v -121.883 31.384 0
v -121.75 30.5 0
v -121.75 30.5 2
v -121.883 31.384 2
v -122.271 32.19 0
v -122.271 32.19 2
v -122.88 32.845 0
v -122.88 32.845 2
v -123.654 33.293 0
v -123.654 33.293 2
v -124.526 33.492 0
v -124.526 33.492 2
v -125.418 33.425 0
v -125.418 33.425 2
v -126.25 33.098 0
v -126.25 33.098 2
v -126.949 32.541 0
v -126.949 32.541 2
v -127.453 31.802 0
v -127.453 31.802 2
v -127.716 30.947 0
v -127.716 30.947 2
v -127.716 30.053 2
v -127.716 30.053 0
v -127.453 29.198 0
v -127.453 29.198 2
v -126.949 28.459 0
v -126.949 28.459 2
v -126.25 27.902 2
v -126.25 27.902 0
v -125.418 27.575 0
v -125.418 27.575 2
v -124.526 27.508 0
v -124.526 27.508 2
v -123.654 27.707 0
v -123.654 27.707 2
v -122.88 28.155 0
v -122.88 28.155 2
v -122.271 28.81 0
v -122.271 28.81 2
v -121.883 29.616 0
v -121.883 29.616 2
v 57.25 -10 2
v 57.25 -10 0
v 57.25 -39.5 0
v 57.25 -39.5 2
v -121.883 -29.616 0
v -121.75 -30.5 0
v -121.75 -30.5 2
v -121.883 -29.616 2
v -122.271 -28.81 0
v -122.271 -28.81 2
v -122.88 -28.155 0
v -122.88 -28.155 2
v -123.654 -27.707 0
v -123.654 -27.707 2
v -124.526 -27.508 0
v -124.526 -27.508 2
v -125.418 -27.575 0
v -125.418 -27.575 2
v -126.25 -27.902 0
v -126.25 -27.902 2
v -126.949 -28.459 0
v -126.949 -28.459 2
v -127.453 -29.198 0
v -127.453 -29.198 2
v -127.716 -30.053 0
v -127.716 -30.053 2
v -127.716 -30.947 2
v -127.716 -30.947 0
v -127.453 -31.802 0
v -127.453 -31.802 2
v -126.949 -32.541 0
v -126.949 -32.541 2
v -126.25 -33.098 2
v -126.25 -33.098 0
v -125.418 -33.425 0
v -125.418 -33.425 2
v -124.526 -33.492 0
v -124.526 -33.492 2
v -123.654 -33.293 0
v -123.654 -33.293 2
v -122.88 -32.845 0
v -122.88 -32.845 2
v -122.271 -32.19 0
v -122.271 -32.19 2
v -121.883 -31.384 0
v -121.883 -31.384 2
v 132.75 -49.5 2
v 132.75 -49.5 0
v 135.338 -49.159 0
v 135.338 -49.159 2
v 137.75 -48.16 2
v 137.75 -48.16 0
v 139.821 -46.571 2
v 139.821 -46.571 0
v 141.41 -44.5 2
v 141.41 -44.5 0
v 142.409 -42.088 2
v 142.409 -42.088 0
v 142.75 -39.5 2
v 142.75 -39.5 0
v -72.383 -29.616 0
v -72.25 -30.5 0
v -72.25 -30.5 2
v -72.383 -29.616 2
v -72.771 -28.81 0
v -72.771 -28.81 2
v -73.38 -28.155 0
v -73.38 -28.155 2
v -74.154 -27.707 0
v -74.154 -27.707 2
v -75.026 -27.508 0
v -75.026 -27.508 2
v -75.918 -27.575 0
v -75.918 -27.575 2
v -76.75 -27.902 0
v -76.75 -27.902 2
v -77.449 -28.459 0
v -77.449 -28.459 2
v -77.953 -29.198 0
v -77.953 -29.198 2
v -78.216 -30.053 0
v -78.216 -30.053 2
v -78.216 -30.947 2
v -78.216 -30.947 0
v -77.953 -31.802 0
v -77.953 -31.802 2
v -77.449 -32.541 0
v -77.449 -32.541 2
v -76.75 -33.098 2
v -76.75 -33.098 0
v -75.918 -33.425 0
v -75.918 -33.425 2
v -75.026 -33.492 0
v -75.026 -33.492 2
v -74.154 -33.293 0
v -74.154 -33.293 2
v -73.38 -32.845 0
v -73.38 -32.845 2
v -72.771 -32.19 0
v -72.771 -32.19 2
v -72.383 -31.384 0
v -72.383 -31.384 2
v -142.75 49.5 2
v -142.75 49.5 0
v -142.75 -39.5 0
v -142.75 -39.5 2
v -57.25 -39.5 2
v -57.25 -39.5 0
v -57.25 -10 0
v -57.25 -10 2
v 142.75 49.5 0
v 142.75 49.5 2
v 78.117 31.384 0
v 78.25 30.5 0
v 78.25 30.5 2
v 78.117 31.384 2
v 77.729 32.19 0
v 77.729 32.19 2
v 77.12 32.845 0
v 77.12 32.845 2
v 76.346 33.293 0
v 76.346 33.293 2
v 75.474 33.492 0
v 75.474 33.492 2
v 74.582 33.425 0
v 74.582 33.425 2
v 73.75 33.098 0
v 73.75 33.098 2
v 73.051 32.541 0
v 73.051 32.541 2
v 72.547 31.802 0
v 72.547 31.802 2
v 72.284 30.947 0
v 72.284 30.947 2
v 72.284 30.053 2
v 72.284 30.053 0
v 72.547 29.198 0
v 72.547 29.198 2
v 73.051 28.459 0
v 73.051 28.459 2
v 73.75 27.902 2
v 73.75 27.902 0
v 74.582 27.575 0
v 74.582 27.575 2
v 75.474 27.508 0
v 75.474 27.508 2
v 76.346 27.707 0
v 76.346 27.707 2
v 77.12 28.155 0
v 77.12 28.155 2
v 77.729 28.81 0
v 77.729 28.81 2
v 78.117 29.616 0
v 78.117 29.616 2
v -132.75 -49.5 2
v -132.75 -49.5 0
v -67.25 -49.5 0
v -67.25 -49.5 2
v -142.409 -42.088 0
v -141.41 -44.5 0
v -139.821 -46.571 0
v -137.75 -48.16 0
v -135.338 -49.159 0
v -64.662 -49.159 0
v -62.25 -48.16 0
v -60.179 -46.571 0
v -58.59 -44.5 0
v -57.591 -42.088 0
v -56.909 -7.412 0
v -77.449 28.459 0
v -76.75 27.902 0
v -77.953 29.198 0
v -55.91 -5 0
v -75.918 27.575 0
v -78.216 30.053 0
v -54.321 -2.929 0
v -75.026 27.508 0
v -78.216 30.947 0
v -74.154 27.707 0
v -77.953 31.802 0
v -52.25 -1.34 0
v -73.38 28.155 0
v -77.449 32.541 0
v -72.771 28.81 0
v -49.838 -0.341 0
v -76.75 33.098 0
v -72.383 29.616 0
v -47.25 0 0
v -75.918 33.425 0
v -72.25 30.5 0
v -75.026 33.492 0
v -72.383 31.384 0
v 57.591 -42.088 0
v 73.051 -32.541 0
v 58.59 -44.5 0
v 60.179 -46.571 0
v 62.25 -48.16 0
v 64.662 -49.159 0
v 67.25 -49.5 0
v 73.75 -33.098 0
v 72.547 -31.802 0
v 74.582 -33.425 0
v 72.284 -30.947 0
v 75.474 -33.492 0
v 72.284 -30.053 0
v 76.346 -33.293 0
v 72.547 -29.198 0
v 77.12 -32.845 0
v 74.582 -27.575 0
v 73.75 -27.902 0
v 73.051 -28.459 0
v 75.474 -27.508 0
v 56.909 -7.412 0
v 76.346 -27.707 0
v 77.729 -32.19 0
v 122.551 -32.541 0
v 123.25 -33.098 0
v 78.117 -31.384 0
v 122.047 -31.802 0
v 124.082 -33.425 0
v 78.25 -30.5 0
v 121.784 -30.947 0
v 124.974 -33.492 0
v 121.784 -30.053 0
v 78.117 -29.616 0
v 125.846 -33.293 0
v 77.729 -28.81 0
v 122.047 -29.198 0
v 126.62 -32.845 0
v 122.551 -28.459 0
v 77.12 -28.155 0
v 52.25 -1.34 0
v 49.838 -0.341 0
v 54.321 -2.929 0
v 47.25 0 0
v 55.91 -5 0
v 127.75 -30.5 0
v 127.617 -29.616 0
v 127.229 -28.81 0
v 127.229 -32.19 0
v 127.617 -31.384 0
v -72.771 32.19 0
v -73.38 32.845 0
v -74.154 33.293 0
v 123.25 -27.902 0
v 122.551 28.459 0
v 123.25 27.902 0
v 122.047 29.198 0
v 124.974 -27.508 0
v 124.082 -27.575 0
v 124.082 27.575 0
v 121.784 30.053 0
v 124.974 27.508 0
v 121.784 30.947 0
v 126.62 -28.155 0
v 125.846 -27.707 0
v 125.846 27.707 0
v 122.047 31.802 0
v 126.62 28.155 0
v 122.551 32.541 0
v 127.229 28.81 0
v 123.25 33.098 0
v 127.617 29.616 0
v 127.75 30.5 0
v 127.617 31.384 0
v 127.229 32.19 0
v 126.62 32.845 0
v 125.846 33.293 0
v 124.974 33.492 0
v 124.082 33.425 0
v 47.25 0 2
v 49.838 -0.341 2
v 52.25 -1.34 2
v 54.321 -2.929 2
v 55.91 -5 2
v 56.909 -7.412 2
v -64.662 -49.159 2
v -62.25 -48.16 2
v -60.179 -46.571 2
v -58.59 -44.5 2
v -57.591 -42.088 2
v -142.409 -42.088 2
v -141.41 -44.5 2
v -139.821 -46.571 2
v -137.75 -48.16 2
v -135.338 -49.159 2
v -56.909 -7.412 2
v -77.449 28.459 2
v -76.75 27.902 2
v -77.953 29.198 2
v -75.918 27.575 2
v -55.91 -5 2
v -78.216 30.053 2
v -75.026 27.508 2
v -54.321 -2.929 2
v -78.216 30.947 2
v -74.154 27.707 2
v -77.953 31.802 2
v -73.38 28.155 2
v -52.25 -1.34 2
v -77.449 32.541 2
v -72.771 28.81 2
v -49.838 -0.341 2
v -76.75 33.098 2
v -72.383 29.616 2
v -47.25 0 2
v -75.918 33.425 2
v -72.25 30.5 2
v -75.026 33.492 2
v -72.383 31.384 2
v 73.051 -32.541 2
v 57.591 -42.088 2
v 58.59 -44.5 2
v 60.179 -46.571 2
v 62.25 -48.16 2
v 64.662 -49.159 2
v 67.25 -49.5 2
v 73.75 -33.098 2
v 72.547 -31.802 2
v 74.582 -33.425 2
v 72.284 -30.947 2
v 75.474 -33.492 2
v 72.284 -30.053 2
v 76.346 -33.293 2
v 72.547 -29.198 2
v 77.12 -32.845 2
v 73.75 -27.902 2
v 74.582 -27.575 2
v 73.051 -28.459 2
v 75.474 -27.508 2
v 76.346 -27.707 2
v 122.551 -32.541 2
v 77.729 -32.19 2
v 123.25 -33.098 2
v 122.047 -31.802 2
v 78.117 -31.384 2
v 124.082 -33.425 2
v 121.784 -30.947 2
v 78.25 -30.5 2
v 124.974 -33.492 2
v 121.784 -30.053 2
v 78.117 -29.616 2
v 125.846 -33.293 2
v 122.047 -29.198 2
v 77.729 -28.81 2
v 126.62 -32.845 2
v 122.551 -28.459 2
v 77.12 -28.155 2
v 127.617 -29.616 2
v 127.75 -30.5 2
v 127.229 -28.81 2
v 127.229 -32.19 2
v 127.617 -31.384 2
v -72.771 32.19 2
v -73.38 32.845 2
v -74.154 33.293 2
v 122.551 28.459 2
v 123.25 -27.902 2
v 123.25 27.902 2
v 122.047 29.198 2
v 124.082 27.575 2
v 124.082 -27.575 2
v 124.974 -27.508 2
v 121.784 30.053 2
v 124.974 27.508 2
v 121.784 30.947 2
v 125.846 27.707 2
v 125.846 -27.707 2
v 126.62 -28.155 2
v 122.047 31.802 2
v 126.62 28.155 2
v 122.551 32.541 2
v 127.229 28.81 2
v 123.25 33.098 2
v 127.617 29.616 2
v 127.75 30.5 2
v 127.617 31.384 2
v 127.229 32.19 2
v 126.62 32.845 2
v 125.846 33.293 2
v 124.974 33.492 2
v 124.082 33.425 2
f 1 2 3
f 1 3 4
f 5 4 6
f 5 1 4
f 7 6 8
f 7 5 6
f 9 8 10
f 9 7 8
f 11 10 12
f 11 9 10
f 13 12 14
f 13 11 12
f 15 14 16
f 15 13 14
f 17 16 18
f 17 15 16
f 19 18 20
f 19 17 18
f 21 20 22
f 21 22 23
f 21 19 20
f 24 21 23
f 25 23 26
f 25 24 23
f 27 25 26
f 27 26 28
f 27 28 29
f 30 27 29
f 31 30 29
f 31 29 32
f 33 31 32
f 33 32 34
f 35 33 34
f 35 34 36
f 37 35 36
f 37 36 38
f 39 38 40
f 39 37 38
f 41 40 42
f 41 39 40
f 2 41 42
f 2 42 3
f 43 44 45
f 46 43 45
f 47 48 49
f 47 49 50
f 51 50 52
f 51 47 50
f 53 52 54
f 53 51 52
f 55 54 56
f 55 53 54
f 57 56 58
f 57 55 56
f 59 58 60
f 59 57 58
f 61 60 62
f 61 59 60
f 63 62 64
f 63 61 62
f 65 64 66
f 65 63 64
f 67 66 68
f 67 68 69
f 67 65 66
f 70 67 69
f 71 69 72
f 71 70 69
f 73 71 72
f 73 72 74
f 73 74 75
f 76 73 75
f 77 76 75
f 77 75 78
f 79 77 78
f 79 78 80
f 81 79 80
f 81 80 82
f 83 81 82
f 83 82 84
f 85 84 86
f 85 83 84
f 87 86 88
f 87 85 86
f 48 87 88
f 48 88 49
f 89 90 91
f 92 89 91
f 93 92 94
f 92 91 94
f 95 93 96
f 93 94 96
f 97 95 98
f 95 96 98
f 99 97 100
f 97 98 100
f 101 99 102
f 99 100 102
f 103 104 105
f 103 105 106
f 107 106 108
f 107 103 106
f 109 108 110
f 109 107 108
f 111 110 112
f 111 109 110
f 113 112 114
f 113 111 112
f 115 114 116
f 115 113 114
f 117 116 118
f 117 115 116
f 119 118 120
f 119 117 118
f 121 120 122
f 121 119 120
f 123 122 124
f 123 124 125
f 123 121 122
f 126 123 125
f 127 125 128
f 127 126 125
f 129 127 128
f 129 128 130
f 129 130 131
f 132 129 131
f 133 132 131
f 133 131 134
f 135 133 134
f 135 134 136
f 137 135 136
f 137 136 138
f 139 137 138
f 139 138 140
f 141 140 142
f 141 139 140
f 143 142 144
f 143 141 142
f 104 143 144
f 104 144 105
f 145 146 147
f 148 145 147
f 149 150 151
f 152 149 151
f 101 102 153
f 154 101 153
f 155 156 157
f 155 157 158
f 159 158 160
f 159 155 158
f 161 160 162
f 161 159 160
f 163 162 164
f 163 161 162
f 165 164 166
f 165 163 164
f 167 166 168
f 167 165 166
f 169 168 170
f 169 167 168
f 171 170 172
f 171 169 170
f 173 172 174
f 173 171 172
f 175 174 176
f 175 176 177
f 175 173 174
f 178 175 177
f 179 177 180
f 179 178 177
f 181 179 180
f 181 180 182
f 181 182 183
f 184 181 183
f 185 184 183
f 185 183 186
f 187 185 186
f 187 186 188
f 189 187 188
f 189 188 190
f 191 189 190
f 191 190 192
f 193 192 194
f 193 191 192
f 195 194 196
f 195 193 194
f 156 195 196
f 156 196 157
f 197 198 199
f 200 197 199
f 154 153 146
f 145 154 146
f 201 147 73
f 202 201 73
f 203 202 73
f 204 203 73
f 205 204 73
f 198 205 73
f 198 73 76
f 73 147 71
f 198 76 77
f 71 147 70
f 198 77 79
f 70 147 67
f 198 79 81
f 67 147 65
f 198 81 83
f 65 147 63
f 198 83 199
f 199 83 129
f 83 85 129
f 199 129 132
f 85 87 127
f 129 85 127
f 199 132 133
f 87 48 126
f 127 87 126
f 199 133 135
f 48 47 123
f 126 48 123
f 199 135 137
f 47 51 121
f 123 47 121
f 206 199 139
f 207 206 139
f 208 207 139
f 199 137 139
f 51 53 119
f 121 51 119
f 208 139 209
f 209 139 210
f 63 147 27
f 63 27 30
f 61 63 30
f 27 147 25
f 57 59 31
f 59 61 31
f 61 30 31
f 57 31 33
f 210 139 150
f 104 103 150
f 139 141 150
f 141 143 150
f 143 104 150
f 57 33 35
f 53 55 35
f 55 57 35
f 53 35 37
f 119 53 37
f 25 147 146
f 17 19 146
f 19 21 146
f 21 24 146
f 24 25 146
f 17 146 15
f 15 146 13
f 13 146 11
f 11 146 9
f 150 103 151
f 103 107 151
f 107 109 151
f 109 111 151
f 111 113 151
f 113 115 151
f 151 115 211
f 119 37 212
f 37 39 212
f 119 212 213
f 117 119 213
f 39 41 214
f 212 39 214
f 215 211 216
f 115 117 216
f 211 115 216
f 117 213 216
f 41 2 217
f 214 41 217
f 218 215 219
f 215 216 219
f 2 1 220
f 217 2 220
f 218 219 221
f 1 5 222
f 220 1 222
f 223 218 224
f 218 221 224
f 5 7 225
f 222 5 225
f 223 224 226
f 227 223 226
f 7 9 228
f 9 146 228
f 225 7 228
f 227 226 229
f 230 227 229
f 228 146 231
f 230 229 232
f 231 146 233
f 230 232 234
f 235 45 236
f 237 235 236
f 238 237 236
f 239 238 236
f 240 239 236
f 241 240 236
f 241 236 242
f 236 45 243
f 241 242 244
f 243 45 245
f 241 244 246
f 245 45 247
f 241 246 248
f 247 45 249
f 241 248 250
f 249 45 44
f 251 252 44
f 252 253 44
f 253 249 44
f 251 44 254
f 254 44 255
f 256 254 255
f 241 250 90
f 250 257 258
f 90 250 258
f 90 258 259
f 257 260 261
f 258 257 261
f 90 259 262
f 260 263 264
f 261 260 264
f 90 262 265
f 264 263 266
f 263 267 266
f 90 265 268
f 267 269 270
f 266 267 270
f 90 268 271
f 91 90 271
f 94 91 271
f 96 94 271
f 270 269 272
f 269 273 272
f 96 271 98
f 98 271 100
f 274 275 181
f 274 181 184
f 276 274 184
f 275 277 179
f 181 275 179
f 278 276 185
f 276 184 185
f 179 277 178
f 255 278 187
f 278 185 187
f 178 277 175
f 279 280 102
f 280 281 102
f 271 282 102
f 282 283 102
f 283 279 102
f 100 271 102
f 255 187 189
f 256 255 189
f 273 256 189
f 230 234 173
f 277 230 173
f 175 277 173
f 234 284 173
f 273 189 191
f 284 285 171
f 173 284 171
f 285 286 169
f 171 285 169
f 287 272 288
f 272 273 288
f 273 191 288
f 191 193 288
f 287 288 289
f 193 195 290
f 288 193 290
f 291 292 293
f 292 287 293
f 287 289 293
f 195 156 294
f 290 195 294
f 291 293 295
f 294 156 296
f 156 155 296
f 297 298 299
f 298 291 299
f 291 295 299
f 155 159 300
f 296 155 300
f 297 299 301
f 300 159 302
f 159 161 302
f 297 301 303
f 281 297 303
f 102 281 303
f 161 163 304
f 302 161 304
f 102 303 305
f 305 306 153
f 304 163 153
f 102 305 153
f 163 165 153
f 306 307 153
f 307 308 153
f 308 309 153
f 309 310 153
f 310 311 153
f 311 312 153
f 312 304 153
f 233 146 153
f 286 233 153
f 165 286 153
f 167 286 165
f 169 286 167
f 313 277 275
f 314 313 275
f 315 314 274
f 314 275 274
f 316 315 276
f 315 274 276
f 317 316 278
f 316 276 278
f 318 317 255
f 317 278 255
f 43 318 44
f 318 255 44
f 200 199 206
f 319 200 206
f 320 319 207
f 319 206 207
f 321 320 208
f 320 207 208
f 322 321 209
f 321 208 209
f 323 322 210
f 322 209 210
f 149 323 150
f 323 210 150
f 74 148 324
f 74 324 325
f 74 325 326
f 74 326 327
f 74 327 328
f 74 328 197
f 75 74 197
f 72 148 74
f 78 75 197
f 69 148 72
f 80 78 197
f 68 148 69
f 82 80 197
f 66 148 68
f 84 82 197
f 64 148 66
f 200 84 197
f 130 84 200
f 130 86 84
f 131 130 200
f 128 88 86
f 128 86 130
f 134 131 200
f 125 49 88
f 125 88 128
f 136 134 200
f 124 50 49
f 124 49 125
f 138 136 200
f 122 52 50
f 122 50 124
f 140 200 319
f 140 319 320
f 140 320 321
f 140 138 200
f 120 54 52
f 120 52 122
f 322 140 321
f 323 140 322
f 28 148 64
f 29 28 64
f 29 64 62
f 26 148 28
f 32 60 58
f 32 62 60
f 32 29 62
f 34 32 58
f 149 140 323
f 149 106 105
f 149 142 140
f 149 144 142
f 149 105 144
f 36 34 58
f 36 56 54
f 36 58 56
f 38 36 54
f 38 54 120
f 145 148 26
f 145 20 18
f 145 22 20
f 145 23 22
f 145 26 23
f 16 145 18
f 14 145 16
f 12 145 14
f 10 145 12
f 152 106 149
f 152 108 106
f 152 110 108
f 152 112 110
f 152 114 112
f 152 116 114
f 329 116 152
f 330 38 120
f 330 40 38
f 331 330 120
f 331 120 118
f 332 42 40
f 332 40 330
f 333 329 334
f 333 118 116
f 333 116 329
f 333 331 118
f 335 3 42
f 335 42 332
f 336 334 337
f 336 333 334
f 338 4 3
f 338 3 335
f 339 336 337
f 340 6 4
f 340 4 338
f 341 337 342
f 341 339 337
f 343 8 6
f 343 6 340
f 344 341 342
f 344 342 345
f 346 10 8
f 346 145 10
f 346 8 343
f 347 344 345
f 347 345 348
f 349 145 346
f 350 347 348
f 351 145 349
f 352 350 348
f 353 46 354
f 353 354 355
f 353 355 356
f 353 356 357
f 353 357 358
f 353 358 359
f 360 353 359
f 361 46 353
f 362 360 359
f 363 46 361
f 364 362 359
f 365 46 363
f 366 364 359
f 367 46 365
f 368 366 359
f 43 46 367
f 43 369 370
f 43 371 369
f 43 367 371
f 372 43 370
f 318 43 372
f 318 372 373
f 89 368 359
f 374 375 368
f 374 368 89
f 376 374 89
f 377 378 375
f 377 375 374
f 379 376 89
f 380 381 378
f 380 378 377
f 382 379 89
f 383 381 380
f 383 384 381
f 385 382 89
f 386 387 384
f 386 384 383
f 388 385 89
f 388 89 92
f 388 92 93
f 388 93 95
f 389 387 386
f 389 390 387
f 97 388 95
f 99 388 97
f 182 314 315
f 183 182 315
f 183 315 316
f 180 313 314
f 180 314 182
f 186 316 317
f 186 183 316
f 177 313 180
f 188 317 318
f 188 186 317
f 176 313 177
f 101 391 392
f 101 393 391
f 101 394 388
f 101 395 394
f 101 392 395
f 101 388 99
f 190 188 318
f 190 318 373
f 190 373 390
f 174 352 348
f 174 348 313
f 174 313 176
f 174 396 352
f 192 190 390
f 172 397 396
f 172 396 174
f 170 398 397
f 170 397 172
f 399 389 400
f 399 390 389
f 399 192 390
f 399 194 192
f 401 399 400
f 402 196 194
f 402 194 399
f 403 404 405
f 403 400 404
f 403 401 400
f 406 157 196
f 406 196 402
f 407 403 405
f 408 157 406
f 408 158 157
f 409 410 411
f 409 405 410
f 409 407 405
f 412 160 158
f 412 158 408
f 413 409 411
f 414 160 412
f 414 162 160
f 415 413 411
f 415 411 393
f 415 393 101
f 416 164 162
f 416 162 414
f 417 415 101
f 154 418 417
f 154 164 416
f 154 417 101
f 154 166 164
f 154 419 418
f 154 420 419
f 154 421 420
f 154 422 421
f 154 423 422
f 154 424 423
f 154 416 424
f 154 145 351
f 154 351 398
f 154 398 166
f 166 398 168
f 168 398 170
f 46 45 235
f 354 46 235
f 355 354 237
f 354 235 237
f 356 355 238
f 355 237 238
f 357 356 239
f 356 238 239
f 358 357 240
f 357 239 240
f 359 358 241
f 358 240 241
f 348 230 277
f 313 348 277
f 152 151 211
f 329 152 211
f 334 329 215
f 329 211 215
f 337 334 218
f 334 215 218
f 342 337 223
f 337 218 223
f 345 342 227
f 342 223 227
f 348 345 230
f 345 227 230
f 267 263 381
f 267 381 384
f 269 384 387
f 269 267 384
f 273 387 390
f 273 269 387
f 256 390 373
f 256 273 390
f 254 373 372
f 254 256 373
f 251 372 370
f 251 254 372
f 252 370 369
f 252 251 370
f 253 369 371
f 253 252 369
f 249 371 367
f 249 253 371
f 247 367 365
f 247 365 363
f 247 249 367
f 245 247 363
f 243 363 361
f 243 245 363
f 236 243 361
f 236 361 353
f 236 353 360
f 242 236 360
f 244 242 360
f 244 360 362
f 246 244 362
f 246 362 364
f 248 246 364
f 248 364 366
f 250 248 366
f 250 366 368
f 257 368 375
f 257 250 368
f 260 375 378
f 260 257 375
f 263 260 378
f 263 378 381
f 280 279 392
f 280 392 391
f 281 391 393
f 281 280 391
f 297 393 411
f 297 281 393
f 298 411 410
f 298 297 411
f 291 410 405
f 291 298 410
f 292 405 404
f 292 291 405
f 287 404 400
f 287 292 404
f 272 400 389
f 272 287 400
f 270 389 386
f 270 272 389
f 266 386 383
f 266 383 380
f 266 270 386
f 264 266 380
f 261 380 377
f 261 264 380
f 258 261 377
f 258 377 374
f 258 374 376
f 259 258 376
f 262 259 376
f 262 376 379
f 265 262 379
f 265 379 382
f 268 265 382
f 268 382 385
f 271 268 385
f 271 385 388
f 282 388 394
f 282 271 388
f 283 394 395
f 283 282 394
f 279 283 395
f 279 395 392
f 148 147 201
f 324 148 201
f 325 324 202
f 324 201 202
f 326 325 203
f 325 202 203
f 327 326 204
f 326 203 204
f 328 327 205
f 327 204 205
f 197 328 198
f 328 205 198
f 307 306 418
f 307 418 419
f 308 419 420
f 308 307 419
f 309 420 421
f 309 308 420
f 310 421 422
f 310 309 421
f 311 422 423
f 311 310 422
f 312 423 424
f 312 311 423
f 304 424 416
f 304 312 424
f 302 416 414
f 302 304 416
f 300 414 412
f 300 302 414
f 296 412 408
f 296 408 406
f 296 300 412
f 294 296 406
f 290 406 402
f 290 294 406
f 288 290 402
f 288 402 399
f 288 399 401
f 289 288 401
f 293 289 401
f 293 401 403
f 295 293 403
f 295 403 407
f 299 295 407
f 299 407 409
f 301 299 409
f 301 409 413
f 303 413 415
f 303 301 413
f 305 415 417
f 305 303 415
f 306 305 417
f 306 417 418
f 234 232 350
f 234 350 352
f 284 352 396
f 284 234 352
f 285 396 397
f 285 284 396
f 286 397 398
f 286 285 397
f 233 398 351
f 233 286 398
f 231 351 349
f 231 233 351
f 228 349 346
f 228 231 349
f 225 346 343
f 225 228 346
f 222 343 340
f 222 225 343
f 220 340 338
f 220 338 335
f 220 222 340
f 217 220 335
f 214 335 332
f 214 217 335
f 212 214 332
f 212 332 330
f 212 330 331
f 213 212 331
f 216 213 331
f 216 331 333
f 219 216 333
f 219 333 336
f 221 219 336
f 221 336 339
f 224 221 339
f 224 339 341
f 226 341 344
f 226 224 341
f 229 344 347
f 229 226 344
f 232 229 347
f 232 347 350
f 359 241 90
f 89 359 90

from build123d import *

# Parameters (mm, degrees)
SKETCH1_R           = 3
BOSS_EXTRUDE1_DEPTH = 2


with BuildPart() as part:
    # Sketch1 → Boss-Extrude1 (new body)
    with BuildSketch(Plane.XY):
        with BuildLine():
            Line((-142.75, 49.5), (-142.75, -39.5))
            ThreePointArc((-142.75, -39.5), (-139.821067812, -46.571067812), (-132.75, -49.5))
            Line((-132.75, -49.5), (-67.25, -49.5))
            ThreePointArc((-67.25, -49.5), (-60.178932188, -46.571067812), (-57.25, -39.5))
            Line((-57.25, -39.5), (-57.25, -10))
            ThreePointArc((-57.25, -10), (-54.321067812, -2.928932188), (-47.25, 0))
            Line((-47.25, 0), (47.25, 0))
            ThreePointArc((47.25, 0), (54.321067812, -2.928932188), (57.25, -10))
            Line((57.25, -10), (57.25, -39.5))
            ThreePointArc((57.25, -39.5), (60.178932188, -46.571067812), (67.25, -49.5))
            Line((67.25, -49.5), (132.75, -49.5))
            ThreePointArc((132.75, -49.5), (139.821067812, -46.571067812), (142.75, -39.5))
            Line((142.75, -39.5), (142.75, 49.5))
            Line((142.75, 49.5), (-142.75, 49.5))
        make_face()
        with Locations((124.75, 30.5)):
            Circle(SKETCH1_R, mode=Mode.SUBTRACT)
        with Locations((124.75, -30.5)):
            Circle(SKETCH1_R, mode=Mode.SUBTRACT)
        with Locations((75.25, -30.5)):
            Circle(SKETCH1_R, mode=Mode.SUBTRACT)
        with Locations((75.25, 30.5)):
            Circle(SKETCH1_R, mode=Mode.SUBTRACT)
        with Locations((-75.25, -30.5)):
            Circle(SKETCH1_R, mode=Mode.SUBTRACT)
        with Locations((-75.25, 30.5)):
            Circle(SKETCH1_R, mode=Mode.SUBTRACT)
        with Locations((-124.75, 30.5)):
            Circle(SKETCH1_R, mode=Mode.SUBTRACT)
        with Locations((-124.75, -30.5)):
            Circle(SKETCH1_R, mode=Mode.SUBTRACT)
    extrude(amount=BOSS_EXTRUDE1_DEPTH)


solid = part.part
